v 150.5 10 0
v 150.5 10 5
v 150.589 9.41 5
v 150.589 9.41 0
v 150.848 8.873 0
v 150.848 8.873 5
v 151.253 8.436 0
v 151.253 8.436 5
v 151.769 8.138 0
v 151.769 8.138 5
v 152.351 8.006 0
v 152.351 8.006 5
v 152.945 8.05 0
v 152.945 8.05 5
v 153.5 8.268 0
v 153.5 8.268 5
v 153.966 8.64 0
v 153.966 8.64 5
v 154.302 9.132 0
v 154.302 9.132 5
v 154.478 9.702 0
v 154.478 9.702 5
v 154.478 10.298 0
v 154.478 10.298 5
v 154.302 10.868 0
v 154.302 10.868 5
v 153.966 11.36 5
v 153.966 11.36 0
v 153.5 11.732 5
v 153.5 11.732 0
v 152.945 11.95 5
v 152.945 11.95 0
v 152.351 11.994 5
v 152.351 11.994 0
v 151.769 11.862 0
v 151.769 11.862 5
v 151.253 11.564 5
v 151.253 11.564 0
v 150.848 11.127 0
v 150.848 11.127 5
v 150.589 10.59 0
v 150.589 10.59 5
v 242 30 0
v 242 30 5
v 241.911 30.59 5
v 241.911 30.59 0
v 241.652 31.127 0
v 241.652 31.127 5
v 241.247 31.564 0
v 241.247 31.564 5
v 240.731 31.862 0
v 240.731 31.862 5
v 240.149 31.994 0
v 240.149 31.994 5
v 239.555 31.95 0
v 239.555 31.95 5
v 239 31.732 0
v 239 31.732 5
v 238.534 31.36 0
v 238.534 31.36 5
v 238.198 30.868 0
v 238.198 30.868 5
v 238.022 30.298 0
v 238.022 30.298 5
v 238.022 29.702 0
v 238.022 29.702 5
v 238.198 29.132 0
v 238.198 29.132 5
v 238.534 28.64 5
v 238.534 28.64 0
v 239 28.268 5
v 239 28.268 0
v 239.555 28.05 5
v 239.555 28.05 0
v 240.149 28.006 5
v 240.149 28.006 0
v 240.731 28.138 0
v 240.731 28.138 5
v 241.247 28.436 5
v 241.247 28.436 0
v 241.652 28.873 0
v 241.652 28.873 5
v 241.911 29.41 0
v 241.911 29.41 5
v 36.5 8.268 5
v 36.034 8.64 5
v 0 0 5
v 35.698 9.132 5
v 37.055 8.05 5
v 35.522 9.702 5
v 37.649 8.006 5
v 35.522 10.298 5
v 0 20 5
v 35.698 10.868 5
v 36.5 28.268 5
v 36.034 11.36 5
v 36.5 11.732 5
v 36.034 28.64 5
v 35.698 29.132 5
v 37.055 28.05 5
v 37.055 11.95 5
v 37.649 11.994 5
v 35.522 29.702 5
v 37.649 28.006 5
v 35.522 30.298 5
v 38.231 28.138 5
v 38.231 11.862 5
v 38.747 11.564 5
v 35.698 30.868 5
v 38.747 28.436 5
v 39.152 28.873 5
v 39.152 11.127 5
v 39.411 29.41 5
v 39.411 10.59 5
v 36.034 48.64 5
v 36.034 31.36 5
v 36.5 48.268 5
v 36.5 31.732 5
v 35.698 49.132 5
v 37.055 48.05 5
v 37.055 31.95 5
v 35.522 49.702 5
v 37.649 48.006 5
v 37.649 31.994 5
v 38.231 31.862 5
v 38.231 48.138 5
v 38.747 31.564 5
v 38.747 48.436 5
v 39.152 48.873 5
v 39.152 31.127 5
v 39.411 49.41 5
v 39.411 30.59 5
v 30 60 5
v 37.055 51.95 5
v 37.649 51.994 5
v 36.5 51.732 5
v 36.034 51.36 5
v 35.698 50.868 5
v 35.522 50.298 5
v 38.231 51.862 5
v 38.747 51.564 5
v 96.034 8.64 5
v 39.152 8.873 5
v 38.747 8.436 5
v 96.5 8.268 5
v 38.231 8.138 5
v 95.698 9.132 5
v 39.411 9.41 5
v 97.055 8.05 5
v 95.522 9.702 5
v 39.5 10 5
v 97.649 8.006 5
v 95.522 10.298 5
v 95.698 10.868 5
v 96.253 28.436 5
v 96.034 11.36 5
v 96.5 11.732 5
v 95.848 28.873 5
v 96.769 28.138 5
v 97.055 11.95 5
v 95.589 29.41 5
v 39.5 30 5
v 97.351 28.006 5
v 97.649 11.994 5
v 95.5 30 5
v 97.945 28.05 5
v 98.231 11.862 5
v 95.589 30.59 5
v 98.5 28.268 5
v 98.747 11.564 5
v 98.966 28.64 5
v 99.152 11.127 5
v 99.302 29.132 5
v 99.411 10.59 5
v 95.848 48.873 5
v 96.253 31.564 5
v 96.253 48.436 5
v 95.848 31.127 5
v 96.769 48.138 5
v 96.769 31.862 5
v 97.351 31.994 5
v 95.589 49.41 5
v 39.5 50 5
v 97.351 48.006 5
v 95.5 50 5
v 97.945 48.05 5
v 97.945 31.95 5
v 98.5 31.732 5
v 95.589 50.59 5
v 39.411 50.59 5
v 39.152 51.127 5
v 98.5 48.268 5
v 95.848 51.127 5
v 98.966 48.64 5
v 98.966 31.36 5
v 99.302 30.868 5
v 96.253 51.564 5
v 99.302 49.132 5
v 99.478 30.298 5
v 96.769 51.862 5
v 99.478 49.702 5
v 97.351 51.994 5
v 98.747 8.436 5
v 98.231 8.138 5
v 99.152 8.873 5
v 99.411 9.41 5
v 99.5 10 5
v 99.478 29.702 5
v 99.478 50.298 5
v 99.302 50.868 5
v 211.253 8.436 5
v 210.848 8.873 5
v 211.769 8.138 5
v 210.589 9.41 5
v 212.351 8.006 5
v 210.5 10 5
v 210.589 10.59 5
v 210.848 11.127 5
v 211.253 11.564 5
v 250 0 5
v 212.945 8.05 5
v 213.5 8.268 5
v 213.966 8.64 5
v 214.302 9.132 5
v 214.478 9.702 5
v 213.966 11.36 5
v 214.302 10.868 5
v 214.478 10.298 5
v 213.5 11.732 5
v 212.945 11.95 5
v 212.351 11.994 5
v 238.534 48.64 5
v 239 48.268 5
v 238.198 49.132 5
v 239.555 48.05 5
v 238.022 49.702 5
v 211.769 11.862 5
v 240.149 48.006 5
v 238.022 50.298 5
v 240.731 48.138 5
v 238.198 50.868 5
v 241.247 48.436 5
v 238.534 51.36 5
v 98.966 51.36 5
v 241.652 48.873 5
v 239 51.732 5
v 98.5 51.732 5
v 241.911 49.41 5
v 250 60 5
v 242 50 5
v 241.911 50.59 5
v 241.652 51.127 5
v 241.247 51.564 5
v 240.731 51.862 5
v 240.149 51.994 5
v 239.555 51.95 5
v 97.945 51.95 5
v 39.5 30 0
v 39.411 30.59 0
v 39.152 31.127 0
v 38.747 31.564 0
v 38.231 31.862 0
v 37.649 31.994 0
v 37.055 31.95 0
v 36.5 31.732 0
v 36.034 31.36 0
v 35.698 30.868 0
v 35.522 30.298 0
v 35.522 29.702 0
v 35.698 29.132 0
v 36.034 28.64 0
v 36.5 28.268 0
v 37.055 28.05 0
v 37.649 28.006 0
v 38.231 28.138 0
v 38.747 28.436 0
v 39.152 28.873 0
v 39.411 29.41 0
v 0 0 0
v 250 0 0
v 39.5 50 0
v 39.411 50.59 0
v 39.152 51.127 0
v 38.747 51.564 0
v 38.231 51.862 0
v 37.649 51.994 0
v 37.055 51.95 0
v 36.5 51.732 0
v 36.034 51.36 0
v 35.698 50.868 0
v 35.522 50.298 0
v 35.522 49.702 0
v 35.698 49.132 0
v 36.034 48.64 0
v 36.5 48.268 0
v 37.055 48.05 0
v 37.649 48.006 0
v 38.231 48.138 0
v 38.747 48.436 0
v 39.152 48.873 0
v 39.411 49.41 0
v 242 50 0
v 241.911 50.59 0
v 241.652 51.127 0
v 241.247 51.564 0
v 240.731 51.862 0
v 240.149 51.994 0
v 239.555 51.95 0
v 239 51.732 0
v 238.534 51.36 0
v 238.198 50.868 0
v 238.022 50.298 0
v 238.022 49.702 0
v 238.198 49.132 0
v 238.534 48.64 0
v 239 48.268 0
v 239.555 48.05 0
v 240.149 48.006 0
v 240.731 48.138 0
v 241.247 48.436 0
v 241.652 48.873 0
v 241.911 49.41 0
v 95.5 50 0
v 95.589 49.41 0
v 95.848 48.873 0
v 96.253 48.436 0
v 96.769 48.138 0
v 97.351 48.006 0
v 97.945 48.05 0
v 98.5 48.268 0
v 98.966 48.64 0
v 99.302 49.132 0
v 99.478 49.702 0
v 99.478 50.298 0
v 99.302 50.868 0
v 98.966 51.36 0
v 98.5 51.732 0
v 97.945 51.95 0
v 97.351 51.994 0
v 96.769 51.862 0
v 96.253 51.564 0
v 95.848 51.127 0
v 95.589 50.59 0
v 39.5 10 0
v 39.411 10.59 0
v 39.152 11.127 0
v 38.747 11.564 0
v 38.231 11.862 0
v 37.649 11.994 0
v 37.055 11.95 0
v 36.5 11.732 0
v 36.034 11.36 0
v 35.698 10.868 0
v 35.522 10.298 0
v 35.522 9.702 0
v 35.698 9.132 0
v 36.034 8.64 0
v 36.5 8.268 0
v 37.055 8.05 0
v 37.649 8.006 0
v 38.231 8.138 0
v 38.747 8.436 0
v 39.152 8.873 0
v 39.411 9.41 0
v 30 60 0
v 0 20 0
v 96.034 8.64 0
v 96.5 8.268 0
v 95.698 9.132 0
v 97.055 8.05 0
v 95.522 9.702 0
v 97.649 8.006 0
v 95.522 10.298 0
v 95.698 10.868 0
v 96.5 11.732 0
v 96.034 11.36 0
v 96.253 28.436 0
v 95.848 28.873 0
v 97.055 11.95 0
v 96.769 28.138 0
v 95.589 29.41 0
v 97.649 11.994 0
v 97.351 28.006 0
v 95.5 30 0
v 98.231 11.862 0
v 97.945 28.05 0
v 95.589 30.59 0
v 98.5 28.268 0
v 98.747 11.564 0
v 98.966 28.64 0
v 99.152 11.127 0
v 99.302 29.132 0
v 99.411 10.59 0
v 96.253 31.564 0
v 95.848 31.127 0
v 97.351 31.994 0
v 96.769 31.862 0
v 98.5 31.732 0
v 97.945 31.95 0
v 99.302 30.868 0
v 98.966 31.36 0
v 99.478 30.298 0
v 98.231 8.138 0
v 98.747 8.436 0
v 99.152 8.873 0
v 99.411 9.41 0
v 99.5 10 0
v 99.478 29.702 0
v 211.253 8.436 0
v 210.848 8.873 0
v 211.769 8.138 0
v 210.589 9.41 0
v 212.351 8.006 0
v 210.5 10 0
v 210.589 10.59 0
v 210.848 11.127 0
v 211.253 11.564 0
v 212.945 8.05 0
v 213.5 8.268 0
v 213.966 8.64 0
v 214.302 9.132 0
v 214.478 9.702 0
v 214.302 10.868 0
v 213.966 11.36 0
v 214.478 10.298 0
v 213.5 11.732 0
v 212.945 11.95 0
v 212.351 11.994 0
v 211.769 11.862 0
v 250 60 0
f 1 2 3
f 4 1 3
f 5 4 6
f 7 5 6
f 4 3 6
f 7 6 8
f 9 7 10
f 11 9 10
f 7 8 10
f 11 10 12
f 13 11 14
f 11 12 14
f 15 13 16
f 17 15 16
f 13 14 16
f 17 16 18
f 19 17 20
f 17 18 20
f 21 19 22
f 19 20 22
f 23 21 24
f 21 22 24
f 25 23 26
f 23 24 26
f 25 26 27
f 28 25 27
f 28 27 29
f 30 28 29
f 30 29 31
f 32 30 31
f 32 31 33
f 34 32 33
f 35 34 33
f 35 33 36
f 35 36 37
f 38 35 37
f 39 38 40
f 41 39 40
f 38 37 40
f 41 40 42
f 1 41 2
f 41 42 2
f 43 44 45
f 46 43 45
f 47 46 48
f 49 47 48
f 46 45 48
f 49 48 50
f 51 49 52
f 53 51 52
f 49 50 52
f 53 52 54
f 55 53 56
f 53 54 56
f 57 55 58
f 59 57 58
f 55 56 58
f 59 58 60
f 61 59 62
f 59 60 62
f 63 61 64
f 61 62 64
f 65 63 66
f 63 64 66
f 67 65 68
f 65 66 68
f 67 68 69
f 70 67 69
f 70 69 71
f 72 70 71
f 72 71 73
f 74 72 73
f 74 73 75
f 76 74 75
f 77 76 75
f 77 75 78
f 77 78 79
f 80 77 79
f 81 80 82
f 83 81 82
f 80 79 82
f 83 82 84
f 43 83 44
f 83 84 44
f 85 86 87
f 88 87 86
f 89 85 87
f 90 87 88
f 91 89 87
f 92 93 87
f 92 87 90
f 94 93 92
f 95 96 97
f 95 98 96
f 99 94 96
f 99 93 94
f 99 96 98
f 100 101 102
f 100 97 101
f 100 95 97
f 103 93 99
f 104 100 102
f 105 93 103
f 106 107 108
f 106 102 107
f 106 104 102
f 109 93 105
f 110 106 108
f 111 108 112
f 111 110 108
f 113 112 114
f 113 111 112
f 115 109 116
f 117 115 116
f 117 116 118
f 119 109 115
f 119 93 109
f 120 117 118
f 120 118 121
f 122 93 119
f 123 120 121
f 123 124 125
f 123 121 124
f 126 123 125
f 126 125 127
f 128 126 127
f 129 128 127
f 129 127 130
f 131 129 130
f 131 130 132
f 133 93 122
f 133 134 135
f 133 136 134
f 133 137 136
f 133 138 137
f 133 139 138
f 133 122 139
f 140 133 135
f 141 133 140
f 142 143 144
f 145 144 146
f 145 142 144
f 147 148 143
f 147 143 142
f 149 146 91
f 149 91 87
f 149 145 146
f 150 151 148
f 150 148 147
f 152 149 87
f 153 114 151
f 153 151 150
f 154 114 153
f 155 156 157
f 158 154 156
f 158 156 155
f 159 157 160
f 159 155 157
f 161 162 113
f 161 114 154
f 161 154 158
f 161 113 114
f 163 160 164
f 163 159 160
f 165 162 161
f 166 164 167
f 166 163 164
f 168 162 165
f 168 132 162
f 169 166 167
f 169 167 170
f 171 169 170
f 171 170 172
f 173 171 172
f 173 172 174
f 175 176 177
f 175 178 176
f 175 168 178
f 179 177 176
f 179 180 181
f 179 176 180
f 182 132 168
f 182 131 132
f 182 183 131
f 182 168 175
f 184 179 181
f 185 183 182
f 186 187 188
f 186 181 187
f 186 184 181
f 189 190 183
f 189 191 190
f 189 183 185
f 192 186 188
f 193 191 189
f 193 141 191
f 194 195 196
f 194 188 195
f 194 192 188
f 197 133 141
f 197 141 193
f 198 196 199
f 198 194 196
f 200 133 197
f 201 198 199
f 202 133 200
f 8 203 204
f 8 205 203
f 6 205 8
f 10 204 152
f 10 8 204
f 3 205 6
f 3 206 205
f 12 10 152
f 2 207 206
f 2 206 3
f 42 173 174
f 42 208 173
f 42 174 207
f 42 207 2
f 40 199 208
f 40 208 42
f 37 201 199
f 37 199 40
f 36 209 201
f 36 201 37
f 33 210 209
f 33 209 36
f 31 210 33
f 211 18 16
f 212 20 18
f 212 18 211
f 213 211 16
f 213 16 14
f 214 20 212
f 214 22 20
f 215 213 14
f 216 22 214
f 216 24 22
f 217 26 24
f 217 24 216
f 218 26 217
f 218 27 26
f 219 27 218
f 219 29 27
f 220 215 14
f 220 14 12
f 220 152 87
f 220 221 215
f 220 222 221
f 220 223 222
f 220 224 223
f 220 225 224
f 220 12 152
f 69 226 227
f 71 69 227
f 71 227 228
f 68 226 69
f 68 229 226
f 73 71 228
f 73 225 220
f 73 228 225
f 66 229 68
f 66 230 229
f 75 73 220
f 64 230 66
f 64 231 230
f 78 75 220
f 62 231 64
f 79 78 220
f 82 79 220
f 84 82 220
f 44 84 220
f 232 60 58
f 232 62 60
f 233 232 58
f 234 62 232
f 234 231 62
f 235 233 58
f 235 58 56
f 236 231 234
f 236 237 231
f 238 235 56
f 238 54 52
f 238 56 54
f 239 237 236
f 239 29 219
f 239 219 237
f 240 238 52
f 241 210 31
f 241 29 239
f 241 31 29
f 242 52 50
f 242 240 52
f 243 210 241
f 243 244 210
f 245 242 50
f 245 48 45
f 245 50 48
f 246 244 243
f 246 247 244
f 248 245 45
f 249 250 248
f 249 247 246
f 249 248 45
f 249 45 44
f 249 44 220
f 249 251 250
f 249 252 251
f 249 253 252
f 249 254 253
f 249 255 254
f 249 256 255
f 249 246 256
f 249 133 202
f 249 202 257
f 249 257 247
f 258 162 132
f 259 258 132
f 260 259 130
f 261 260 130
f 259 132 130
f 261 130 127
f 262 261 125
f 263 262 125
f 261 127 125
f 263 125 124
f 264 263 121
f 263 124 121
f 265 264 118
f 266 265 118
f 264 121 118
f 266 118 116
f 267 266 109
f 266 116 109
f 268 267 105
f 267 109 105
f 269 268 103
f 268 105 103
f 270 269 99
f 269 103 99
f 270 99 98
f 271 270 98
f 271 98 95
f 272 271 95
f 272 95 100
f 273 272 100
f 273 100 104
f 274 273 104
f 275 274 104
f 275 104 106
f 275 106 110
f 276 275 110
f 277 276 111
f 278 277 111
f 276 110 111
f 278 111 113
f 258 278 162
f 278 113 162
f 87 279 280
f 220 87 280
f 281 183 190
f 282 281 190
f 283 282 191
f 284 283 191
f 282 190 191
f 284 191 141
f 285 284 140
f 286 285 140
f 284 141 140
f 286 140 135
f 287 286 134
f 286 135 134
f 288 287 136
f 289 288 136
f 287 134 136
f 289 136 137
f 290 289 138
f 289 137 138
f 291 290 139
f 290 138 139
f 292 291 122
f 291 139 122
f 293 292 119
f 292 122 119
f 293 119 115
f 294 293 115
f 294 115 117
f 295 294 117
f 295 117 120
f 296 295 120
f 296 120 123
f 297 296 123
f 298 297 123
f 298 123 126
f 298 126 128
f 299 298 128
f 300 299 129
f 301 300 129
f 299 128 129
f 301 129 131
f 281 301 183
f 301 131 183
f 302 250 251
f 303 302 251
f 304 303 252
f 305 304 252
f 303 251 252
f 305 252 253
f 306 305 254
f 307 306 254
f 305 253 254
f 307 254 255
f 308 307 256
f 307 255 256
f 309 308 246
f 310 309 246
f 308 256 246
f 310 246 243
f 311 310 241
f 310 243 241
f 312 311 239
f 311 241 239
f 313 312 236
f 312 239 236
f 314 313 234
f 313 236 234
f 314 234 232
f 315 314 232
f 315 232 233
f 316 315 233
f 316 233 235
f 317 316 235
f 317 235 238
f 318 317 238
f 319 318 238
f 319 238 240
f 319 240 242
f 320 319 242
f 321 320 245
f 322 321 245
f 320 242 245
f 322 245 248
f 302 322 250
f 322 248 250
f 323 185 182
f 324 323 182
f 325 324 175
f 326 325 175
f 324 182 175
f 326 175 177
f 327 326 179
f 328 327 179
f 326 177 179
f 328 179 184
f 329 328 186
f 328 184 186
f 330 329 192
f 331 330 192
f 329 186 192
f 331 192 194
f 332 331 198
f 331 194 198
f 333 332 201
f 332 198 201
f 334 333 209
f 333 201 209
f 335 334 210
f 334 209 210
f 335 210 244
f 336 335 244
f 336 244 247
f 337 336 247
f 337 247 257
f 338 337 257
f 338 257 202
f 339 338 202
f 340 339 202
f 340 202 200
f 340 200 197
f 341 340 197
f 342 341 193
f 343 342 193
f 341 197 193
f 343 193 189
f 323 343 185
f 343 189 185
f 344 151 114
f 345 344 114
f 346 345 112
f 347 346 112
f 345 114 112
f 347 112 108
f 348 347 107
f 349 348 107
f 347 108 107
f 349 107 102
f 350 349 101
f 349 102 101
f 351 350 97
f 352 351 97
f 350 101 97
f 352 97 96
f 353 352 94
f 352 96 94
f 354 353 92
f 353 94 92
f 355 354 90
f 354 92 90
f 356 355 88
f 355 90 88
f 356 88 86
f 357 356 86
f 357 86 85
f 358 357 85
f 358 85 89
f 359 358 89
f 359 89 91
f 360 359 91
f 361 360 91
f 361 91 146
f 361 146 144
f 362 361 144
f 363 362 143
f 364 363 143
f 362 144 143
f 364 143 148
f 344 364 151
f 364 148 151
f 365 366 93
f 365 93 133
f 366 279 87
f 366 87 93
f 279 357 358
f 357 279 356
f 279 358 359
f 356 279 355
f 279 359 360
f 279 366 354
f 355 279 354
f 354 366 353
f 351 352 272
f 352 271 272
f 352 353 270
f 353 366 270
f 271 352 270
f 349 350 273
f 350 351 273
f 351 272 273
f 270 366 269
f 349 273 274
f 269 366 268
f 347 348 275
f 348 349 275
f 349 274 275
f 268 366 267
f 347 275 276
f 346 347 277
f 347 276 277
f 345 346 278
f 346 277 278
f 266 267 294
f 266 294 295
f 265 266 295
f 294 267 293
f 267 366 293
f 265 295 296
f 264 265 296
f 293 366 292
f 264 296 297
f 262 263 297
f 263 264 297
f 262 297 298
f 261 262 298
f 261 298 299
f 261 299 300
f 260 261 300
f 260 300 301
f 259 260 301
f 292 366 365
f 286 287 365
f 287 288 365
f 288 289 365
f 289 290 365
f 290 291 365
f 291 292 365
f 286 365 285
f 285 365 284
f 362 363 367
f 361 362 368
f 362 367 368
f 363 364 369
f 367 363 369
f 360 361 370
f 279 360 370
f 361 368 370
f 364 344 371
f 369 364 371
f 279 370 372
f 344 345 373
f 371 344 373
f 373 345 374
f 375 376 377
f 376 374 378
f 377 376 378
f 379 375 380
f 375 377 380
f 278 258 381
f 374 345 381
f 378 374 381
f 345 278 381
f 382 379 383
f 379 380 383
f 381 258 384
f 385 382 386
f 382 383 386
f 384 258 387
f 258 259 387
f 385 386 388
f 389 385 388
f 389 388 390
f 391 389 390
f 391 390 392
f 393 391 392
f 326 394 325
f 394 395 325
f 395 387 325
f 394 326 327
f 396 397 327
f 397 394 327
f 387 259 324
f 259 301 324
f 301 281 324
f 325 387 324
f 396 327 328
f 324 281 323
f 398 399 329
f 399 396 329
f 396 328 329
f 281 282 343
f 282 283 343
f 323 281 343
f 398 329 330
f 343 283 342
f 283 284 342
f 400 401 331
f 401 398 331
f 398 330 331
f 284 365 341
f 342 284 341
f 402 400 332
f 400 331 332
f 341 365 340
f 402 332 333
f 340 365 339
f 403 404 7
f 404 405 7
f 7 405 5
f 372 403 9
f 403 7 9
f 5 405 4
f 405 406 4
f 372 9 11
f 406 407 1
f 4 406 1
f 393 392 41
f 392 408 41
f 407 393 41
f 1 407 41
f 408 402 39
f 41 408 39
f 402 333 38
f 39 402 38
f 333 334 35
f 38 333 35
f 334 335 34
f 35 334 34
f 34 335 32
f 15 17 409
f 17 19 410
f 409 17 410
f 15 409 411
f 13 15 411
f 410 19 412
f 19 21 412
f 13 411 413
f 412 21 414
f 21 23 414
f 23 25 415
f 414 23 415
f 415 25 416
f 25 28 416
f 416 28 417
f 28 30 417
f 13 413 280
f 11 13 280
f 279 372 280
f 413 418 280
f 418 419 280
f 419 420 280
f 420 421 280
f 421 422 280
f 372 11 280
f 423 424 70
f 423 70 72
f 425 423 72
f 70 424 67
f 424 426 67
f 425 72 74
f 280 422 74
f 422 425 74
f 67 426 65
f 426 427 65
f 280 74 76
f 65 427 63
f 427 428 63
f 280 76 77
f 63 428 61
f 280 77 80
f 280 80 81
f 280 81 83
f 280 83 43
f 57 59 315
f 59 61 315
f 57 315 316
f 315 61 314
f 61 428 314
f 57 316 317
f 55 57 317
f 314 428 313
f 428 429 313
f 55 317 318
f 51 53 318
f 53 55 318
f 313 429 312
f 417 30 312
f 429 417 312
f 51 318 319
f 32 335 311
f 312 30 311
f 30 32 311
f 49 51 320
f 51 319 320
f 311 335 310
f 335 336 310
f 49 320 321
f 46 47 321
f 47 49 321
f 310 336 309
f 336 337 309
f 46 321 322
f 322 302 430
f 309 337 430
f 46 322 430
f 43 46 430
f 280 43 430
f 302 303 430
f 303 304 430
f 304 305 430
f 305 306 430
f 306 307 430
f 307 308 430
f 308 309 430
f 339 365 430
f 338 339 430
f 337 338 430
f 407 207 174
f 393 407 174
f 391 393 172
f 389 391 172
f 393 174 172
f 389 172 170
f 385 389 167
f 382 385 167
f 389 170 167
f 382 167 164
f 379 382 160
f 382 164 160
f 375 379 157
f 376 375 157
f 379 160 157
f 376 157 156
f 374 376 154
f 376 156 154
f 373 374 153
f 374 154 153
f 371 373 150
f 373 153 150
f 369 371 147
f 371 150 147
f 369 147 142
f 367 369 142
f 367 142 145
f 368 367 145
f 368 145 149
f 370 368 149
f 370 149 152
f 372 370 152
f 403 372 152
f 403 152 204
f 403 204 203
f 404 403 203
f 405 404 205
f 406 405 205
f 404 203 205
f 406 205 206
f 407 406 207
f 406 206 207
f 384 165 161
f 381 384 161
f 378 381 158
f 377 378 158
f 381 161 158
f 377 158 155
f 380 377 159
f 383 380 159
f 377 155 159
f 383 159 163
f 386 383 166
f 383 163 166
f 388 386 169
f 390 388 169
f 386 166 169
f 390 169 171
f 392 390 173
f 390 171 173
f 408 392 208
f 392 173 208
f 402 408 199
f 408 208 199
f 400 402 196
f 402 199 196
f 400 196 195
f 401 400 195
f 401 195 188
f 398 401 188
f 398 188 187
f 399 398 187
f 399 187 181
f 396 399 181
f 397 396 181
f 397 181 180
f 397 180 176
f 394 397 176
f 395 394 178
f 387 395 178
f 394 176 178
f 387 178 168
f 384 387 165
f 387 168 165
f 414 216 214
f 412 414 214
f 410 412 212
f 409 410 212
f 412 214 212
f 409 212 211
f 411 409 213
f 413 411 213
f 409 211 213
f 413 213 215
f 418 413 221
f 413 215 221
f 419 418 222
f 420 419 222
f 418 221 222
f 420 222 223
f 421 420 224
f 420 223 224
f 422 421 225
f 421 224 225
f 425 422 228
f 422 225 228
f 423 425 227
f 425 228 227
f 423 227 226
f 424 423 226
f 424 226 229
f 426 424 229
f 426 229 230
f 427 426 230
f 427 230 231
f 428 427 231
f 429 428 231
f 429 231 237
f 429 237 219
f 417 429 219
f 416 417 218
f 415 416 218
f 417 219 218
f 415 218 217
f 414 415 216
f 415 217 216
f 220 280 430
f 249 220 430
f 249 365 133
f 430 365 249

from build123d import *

# Parameters (mm, degrees)
ESQUISSE1_W                  = 250
ESQUISSE1_H                  = 60
BOSS_EXTRU_1_DEPTH           = 5
ESQUISSE2_R                  = 2
ENL_V_MAT_EXTRU_1_DEPTH      = 5
ENL_V_MAT_EXTRU_2_DEPTH      = 258.147817412
ENL_V_MAT_EXTRU_2_DEPTH_BACK = 258.147817412


with BuildPart() as part:
    # Esquisse1 → Boss.-Extru.1 (new body)
    with BuildSketch(Plane.XY):
        with Locations((125, 30)):
            Rectangle(ESQUISSE1_W, ESQUISSE1_H)
    extrude(amount=BOSS_EXTRU_1_DEPTH)

    # Esquisse2 → Enlèv. mat.-Extru.1 (cut)
    with BuildSketch(Plane.XY.offset(5)):
        with Locations((37.5, 10)):
            Circle(ESQUISSE2_R)
        with Locations((97.5, 10)):
            Circle(ESQUISSE2_R)
        with Locations(Location((152.5, 10, 0), (0, 0, 180))):
            Circle(ESQUISSE2_R)
        with Locations(Location((212.5, 10, 0), (0, 0, 180))):
            Circle(ESQUISSE2_R)
        with Locations((240, 50)):
            Circle(ESQUISSE2_R)
        with Locations((240, 30)):
            Circle(ESQUISSE2_R)
        with Locations((37.5, 30)):
            Circle(ESQUISSE2_R)
        with Locations((37.5, 50)):
            Circle(ESQUISSE2_R)
        with Locations(Location((97.5, 50, 0), (0, 0, 180))):
            Circle(ESQUISSE2_R)
        with Locations(Location((97.5, 30, 0), (0, 0, 180))):
            Circle(ESQUISSE2_R)
    extrude(amount=-ENL_V_MAT_EXTRU_1_DEPTH, mode=Mode.SUBTRACT)

    # Esquisse3 → Enlèv. mat.-Extru.2 (cut, two sides: drawn at the far end of the back side and taken through both)
    with BuildSketch(Plane.XY.offset(5).offset(-ENL_V_MAT_EXTRU_2_DEPTH_BACK)):
        Polygon((0, 20), (30, 60), (0, 60), align=None)
    extrude(amount=ENL_V_MAT_EXTRU_2_DEPTH + ENL_V_MAT_EXTRU_2_DEPTH_BACK, mode=Mode.SUBTRACT)


solid = part.part
